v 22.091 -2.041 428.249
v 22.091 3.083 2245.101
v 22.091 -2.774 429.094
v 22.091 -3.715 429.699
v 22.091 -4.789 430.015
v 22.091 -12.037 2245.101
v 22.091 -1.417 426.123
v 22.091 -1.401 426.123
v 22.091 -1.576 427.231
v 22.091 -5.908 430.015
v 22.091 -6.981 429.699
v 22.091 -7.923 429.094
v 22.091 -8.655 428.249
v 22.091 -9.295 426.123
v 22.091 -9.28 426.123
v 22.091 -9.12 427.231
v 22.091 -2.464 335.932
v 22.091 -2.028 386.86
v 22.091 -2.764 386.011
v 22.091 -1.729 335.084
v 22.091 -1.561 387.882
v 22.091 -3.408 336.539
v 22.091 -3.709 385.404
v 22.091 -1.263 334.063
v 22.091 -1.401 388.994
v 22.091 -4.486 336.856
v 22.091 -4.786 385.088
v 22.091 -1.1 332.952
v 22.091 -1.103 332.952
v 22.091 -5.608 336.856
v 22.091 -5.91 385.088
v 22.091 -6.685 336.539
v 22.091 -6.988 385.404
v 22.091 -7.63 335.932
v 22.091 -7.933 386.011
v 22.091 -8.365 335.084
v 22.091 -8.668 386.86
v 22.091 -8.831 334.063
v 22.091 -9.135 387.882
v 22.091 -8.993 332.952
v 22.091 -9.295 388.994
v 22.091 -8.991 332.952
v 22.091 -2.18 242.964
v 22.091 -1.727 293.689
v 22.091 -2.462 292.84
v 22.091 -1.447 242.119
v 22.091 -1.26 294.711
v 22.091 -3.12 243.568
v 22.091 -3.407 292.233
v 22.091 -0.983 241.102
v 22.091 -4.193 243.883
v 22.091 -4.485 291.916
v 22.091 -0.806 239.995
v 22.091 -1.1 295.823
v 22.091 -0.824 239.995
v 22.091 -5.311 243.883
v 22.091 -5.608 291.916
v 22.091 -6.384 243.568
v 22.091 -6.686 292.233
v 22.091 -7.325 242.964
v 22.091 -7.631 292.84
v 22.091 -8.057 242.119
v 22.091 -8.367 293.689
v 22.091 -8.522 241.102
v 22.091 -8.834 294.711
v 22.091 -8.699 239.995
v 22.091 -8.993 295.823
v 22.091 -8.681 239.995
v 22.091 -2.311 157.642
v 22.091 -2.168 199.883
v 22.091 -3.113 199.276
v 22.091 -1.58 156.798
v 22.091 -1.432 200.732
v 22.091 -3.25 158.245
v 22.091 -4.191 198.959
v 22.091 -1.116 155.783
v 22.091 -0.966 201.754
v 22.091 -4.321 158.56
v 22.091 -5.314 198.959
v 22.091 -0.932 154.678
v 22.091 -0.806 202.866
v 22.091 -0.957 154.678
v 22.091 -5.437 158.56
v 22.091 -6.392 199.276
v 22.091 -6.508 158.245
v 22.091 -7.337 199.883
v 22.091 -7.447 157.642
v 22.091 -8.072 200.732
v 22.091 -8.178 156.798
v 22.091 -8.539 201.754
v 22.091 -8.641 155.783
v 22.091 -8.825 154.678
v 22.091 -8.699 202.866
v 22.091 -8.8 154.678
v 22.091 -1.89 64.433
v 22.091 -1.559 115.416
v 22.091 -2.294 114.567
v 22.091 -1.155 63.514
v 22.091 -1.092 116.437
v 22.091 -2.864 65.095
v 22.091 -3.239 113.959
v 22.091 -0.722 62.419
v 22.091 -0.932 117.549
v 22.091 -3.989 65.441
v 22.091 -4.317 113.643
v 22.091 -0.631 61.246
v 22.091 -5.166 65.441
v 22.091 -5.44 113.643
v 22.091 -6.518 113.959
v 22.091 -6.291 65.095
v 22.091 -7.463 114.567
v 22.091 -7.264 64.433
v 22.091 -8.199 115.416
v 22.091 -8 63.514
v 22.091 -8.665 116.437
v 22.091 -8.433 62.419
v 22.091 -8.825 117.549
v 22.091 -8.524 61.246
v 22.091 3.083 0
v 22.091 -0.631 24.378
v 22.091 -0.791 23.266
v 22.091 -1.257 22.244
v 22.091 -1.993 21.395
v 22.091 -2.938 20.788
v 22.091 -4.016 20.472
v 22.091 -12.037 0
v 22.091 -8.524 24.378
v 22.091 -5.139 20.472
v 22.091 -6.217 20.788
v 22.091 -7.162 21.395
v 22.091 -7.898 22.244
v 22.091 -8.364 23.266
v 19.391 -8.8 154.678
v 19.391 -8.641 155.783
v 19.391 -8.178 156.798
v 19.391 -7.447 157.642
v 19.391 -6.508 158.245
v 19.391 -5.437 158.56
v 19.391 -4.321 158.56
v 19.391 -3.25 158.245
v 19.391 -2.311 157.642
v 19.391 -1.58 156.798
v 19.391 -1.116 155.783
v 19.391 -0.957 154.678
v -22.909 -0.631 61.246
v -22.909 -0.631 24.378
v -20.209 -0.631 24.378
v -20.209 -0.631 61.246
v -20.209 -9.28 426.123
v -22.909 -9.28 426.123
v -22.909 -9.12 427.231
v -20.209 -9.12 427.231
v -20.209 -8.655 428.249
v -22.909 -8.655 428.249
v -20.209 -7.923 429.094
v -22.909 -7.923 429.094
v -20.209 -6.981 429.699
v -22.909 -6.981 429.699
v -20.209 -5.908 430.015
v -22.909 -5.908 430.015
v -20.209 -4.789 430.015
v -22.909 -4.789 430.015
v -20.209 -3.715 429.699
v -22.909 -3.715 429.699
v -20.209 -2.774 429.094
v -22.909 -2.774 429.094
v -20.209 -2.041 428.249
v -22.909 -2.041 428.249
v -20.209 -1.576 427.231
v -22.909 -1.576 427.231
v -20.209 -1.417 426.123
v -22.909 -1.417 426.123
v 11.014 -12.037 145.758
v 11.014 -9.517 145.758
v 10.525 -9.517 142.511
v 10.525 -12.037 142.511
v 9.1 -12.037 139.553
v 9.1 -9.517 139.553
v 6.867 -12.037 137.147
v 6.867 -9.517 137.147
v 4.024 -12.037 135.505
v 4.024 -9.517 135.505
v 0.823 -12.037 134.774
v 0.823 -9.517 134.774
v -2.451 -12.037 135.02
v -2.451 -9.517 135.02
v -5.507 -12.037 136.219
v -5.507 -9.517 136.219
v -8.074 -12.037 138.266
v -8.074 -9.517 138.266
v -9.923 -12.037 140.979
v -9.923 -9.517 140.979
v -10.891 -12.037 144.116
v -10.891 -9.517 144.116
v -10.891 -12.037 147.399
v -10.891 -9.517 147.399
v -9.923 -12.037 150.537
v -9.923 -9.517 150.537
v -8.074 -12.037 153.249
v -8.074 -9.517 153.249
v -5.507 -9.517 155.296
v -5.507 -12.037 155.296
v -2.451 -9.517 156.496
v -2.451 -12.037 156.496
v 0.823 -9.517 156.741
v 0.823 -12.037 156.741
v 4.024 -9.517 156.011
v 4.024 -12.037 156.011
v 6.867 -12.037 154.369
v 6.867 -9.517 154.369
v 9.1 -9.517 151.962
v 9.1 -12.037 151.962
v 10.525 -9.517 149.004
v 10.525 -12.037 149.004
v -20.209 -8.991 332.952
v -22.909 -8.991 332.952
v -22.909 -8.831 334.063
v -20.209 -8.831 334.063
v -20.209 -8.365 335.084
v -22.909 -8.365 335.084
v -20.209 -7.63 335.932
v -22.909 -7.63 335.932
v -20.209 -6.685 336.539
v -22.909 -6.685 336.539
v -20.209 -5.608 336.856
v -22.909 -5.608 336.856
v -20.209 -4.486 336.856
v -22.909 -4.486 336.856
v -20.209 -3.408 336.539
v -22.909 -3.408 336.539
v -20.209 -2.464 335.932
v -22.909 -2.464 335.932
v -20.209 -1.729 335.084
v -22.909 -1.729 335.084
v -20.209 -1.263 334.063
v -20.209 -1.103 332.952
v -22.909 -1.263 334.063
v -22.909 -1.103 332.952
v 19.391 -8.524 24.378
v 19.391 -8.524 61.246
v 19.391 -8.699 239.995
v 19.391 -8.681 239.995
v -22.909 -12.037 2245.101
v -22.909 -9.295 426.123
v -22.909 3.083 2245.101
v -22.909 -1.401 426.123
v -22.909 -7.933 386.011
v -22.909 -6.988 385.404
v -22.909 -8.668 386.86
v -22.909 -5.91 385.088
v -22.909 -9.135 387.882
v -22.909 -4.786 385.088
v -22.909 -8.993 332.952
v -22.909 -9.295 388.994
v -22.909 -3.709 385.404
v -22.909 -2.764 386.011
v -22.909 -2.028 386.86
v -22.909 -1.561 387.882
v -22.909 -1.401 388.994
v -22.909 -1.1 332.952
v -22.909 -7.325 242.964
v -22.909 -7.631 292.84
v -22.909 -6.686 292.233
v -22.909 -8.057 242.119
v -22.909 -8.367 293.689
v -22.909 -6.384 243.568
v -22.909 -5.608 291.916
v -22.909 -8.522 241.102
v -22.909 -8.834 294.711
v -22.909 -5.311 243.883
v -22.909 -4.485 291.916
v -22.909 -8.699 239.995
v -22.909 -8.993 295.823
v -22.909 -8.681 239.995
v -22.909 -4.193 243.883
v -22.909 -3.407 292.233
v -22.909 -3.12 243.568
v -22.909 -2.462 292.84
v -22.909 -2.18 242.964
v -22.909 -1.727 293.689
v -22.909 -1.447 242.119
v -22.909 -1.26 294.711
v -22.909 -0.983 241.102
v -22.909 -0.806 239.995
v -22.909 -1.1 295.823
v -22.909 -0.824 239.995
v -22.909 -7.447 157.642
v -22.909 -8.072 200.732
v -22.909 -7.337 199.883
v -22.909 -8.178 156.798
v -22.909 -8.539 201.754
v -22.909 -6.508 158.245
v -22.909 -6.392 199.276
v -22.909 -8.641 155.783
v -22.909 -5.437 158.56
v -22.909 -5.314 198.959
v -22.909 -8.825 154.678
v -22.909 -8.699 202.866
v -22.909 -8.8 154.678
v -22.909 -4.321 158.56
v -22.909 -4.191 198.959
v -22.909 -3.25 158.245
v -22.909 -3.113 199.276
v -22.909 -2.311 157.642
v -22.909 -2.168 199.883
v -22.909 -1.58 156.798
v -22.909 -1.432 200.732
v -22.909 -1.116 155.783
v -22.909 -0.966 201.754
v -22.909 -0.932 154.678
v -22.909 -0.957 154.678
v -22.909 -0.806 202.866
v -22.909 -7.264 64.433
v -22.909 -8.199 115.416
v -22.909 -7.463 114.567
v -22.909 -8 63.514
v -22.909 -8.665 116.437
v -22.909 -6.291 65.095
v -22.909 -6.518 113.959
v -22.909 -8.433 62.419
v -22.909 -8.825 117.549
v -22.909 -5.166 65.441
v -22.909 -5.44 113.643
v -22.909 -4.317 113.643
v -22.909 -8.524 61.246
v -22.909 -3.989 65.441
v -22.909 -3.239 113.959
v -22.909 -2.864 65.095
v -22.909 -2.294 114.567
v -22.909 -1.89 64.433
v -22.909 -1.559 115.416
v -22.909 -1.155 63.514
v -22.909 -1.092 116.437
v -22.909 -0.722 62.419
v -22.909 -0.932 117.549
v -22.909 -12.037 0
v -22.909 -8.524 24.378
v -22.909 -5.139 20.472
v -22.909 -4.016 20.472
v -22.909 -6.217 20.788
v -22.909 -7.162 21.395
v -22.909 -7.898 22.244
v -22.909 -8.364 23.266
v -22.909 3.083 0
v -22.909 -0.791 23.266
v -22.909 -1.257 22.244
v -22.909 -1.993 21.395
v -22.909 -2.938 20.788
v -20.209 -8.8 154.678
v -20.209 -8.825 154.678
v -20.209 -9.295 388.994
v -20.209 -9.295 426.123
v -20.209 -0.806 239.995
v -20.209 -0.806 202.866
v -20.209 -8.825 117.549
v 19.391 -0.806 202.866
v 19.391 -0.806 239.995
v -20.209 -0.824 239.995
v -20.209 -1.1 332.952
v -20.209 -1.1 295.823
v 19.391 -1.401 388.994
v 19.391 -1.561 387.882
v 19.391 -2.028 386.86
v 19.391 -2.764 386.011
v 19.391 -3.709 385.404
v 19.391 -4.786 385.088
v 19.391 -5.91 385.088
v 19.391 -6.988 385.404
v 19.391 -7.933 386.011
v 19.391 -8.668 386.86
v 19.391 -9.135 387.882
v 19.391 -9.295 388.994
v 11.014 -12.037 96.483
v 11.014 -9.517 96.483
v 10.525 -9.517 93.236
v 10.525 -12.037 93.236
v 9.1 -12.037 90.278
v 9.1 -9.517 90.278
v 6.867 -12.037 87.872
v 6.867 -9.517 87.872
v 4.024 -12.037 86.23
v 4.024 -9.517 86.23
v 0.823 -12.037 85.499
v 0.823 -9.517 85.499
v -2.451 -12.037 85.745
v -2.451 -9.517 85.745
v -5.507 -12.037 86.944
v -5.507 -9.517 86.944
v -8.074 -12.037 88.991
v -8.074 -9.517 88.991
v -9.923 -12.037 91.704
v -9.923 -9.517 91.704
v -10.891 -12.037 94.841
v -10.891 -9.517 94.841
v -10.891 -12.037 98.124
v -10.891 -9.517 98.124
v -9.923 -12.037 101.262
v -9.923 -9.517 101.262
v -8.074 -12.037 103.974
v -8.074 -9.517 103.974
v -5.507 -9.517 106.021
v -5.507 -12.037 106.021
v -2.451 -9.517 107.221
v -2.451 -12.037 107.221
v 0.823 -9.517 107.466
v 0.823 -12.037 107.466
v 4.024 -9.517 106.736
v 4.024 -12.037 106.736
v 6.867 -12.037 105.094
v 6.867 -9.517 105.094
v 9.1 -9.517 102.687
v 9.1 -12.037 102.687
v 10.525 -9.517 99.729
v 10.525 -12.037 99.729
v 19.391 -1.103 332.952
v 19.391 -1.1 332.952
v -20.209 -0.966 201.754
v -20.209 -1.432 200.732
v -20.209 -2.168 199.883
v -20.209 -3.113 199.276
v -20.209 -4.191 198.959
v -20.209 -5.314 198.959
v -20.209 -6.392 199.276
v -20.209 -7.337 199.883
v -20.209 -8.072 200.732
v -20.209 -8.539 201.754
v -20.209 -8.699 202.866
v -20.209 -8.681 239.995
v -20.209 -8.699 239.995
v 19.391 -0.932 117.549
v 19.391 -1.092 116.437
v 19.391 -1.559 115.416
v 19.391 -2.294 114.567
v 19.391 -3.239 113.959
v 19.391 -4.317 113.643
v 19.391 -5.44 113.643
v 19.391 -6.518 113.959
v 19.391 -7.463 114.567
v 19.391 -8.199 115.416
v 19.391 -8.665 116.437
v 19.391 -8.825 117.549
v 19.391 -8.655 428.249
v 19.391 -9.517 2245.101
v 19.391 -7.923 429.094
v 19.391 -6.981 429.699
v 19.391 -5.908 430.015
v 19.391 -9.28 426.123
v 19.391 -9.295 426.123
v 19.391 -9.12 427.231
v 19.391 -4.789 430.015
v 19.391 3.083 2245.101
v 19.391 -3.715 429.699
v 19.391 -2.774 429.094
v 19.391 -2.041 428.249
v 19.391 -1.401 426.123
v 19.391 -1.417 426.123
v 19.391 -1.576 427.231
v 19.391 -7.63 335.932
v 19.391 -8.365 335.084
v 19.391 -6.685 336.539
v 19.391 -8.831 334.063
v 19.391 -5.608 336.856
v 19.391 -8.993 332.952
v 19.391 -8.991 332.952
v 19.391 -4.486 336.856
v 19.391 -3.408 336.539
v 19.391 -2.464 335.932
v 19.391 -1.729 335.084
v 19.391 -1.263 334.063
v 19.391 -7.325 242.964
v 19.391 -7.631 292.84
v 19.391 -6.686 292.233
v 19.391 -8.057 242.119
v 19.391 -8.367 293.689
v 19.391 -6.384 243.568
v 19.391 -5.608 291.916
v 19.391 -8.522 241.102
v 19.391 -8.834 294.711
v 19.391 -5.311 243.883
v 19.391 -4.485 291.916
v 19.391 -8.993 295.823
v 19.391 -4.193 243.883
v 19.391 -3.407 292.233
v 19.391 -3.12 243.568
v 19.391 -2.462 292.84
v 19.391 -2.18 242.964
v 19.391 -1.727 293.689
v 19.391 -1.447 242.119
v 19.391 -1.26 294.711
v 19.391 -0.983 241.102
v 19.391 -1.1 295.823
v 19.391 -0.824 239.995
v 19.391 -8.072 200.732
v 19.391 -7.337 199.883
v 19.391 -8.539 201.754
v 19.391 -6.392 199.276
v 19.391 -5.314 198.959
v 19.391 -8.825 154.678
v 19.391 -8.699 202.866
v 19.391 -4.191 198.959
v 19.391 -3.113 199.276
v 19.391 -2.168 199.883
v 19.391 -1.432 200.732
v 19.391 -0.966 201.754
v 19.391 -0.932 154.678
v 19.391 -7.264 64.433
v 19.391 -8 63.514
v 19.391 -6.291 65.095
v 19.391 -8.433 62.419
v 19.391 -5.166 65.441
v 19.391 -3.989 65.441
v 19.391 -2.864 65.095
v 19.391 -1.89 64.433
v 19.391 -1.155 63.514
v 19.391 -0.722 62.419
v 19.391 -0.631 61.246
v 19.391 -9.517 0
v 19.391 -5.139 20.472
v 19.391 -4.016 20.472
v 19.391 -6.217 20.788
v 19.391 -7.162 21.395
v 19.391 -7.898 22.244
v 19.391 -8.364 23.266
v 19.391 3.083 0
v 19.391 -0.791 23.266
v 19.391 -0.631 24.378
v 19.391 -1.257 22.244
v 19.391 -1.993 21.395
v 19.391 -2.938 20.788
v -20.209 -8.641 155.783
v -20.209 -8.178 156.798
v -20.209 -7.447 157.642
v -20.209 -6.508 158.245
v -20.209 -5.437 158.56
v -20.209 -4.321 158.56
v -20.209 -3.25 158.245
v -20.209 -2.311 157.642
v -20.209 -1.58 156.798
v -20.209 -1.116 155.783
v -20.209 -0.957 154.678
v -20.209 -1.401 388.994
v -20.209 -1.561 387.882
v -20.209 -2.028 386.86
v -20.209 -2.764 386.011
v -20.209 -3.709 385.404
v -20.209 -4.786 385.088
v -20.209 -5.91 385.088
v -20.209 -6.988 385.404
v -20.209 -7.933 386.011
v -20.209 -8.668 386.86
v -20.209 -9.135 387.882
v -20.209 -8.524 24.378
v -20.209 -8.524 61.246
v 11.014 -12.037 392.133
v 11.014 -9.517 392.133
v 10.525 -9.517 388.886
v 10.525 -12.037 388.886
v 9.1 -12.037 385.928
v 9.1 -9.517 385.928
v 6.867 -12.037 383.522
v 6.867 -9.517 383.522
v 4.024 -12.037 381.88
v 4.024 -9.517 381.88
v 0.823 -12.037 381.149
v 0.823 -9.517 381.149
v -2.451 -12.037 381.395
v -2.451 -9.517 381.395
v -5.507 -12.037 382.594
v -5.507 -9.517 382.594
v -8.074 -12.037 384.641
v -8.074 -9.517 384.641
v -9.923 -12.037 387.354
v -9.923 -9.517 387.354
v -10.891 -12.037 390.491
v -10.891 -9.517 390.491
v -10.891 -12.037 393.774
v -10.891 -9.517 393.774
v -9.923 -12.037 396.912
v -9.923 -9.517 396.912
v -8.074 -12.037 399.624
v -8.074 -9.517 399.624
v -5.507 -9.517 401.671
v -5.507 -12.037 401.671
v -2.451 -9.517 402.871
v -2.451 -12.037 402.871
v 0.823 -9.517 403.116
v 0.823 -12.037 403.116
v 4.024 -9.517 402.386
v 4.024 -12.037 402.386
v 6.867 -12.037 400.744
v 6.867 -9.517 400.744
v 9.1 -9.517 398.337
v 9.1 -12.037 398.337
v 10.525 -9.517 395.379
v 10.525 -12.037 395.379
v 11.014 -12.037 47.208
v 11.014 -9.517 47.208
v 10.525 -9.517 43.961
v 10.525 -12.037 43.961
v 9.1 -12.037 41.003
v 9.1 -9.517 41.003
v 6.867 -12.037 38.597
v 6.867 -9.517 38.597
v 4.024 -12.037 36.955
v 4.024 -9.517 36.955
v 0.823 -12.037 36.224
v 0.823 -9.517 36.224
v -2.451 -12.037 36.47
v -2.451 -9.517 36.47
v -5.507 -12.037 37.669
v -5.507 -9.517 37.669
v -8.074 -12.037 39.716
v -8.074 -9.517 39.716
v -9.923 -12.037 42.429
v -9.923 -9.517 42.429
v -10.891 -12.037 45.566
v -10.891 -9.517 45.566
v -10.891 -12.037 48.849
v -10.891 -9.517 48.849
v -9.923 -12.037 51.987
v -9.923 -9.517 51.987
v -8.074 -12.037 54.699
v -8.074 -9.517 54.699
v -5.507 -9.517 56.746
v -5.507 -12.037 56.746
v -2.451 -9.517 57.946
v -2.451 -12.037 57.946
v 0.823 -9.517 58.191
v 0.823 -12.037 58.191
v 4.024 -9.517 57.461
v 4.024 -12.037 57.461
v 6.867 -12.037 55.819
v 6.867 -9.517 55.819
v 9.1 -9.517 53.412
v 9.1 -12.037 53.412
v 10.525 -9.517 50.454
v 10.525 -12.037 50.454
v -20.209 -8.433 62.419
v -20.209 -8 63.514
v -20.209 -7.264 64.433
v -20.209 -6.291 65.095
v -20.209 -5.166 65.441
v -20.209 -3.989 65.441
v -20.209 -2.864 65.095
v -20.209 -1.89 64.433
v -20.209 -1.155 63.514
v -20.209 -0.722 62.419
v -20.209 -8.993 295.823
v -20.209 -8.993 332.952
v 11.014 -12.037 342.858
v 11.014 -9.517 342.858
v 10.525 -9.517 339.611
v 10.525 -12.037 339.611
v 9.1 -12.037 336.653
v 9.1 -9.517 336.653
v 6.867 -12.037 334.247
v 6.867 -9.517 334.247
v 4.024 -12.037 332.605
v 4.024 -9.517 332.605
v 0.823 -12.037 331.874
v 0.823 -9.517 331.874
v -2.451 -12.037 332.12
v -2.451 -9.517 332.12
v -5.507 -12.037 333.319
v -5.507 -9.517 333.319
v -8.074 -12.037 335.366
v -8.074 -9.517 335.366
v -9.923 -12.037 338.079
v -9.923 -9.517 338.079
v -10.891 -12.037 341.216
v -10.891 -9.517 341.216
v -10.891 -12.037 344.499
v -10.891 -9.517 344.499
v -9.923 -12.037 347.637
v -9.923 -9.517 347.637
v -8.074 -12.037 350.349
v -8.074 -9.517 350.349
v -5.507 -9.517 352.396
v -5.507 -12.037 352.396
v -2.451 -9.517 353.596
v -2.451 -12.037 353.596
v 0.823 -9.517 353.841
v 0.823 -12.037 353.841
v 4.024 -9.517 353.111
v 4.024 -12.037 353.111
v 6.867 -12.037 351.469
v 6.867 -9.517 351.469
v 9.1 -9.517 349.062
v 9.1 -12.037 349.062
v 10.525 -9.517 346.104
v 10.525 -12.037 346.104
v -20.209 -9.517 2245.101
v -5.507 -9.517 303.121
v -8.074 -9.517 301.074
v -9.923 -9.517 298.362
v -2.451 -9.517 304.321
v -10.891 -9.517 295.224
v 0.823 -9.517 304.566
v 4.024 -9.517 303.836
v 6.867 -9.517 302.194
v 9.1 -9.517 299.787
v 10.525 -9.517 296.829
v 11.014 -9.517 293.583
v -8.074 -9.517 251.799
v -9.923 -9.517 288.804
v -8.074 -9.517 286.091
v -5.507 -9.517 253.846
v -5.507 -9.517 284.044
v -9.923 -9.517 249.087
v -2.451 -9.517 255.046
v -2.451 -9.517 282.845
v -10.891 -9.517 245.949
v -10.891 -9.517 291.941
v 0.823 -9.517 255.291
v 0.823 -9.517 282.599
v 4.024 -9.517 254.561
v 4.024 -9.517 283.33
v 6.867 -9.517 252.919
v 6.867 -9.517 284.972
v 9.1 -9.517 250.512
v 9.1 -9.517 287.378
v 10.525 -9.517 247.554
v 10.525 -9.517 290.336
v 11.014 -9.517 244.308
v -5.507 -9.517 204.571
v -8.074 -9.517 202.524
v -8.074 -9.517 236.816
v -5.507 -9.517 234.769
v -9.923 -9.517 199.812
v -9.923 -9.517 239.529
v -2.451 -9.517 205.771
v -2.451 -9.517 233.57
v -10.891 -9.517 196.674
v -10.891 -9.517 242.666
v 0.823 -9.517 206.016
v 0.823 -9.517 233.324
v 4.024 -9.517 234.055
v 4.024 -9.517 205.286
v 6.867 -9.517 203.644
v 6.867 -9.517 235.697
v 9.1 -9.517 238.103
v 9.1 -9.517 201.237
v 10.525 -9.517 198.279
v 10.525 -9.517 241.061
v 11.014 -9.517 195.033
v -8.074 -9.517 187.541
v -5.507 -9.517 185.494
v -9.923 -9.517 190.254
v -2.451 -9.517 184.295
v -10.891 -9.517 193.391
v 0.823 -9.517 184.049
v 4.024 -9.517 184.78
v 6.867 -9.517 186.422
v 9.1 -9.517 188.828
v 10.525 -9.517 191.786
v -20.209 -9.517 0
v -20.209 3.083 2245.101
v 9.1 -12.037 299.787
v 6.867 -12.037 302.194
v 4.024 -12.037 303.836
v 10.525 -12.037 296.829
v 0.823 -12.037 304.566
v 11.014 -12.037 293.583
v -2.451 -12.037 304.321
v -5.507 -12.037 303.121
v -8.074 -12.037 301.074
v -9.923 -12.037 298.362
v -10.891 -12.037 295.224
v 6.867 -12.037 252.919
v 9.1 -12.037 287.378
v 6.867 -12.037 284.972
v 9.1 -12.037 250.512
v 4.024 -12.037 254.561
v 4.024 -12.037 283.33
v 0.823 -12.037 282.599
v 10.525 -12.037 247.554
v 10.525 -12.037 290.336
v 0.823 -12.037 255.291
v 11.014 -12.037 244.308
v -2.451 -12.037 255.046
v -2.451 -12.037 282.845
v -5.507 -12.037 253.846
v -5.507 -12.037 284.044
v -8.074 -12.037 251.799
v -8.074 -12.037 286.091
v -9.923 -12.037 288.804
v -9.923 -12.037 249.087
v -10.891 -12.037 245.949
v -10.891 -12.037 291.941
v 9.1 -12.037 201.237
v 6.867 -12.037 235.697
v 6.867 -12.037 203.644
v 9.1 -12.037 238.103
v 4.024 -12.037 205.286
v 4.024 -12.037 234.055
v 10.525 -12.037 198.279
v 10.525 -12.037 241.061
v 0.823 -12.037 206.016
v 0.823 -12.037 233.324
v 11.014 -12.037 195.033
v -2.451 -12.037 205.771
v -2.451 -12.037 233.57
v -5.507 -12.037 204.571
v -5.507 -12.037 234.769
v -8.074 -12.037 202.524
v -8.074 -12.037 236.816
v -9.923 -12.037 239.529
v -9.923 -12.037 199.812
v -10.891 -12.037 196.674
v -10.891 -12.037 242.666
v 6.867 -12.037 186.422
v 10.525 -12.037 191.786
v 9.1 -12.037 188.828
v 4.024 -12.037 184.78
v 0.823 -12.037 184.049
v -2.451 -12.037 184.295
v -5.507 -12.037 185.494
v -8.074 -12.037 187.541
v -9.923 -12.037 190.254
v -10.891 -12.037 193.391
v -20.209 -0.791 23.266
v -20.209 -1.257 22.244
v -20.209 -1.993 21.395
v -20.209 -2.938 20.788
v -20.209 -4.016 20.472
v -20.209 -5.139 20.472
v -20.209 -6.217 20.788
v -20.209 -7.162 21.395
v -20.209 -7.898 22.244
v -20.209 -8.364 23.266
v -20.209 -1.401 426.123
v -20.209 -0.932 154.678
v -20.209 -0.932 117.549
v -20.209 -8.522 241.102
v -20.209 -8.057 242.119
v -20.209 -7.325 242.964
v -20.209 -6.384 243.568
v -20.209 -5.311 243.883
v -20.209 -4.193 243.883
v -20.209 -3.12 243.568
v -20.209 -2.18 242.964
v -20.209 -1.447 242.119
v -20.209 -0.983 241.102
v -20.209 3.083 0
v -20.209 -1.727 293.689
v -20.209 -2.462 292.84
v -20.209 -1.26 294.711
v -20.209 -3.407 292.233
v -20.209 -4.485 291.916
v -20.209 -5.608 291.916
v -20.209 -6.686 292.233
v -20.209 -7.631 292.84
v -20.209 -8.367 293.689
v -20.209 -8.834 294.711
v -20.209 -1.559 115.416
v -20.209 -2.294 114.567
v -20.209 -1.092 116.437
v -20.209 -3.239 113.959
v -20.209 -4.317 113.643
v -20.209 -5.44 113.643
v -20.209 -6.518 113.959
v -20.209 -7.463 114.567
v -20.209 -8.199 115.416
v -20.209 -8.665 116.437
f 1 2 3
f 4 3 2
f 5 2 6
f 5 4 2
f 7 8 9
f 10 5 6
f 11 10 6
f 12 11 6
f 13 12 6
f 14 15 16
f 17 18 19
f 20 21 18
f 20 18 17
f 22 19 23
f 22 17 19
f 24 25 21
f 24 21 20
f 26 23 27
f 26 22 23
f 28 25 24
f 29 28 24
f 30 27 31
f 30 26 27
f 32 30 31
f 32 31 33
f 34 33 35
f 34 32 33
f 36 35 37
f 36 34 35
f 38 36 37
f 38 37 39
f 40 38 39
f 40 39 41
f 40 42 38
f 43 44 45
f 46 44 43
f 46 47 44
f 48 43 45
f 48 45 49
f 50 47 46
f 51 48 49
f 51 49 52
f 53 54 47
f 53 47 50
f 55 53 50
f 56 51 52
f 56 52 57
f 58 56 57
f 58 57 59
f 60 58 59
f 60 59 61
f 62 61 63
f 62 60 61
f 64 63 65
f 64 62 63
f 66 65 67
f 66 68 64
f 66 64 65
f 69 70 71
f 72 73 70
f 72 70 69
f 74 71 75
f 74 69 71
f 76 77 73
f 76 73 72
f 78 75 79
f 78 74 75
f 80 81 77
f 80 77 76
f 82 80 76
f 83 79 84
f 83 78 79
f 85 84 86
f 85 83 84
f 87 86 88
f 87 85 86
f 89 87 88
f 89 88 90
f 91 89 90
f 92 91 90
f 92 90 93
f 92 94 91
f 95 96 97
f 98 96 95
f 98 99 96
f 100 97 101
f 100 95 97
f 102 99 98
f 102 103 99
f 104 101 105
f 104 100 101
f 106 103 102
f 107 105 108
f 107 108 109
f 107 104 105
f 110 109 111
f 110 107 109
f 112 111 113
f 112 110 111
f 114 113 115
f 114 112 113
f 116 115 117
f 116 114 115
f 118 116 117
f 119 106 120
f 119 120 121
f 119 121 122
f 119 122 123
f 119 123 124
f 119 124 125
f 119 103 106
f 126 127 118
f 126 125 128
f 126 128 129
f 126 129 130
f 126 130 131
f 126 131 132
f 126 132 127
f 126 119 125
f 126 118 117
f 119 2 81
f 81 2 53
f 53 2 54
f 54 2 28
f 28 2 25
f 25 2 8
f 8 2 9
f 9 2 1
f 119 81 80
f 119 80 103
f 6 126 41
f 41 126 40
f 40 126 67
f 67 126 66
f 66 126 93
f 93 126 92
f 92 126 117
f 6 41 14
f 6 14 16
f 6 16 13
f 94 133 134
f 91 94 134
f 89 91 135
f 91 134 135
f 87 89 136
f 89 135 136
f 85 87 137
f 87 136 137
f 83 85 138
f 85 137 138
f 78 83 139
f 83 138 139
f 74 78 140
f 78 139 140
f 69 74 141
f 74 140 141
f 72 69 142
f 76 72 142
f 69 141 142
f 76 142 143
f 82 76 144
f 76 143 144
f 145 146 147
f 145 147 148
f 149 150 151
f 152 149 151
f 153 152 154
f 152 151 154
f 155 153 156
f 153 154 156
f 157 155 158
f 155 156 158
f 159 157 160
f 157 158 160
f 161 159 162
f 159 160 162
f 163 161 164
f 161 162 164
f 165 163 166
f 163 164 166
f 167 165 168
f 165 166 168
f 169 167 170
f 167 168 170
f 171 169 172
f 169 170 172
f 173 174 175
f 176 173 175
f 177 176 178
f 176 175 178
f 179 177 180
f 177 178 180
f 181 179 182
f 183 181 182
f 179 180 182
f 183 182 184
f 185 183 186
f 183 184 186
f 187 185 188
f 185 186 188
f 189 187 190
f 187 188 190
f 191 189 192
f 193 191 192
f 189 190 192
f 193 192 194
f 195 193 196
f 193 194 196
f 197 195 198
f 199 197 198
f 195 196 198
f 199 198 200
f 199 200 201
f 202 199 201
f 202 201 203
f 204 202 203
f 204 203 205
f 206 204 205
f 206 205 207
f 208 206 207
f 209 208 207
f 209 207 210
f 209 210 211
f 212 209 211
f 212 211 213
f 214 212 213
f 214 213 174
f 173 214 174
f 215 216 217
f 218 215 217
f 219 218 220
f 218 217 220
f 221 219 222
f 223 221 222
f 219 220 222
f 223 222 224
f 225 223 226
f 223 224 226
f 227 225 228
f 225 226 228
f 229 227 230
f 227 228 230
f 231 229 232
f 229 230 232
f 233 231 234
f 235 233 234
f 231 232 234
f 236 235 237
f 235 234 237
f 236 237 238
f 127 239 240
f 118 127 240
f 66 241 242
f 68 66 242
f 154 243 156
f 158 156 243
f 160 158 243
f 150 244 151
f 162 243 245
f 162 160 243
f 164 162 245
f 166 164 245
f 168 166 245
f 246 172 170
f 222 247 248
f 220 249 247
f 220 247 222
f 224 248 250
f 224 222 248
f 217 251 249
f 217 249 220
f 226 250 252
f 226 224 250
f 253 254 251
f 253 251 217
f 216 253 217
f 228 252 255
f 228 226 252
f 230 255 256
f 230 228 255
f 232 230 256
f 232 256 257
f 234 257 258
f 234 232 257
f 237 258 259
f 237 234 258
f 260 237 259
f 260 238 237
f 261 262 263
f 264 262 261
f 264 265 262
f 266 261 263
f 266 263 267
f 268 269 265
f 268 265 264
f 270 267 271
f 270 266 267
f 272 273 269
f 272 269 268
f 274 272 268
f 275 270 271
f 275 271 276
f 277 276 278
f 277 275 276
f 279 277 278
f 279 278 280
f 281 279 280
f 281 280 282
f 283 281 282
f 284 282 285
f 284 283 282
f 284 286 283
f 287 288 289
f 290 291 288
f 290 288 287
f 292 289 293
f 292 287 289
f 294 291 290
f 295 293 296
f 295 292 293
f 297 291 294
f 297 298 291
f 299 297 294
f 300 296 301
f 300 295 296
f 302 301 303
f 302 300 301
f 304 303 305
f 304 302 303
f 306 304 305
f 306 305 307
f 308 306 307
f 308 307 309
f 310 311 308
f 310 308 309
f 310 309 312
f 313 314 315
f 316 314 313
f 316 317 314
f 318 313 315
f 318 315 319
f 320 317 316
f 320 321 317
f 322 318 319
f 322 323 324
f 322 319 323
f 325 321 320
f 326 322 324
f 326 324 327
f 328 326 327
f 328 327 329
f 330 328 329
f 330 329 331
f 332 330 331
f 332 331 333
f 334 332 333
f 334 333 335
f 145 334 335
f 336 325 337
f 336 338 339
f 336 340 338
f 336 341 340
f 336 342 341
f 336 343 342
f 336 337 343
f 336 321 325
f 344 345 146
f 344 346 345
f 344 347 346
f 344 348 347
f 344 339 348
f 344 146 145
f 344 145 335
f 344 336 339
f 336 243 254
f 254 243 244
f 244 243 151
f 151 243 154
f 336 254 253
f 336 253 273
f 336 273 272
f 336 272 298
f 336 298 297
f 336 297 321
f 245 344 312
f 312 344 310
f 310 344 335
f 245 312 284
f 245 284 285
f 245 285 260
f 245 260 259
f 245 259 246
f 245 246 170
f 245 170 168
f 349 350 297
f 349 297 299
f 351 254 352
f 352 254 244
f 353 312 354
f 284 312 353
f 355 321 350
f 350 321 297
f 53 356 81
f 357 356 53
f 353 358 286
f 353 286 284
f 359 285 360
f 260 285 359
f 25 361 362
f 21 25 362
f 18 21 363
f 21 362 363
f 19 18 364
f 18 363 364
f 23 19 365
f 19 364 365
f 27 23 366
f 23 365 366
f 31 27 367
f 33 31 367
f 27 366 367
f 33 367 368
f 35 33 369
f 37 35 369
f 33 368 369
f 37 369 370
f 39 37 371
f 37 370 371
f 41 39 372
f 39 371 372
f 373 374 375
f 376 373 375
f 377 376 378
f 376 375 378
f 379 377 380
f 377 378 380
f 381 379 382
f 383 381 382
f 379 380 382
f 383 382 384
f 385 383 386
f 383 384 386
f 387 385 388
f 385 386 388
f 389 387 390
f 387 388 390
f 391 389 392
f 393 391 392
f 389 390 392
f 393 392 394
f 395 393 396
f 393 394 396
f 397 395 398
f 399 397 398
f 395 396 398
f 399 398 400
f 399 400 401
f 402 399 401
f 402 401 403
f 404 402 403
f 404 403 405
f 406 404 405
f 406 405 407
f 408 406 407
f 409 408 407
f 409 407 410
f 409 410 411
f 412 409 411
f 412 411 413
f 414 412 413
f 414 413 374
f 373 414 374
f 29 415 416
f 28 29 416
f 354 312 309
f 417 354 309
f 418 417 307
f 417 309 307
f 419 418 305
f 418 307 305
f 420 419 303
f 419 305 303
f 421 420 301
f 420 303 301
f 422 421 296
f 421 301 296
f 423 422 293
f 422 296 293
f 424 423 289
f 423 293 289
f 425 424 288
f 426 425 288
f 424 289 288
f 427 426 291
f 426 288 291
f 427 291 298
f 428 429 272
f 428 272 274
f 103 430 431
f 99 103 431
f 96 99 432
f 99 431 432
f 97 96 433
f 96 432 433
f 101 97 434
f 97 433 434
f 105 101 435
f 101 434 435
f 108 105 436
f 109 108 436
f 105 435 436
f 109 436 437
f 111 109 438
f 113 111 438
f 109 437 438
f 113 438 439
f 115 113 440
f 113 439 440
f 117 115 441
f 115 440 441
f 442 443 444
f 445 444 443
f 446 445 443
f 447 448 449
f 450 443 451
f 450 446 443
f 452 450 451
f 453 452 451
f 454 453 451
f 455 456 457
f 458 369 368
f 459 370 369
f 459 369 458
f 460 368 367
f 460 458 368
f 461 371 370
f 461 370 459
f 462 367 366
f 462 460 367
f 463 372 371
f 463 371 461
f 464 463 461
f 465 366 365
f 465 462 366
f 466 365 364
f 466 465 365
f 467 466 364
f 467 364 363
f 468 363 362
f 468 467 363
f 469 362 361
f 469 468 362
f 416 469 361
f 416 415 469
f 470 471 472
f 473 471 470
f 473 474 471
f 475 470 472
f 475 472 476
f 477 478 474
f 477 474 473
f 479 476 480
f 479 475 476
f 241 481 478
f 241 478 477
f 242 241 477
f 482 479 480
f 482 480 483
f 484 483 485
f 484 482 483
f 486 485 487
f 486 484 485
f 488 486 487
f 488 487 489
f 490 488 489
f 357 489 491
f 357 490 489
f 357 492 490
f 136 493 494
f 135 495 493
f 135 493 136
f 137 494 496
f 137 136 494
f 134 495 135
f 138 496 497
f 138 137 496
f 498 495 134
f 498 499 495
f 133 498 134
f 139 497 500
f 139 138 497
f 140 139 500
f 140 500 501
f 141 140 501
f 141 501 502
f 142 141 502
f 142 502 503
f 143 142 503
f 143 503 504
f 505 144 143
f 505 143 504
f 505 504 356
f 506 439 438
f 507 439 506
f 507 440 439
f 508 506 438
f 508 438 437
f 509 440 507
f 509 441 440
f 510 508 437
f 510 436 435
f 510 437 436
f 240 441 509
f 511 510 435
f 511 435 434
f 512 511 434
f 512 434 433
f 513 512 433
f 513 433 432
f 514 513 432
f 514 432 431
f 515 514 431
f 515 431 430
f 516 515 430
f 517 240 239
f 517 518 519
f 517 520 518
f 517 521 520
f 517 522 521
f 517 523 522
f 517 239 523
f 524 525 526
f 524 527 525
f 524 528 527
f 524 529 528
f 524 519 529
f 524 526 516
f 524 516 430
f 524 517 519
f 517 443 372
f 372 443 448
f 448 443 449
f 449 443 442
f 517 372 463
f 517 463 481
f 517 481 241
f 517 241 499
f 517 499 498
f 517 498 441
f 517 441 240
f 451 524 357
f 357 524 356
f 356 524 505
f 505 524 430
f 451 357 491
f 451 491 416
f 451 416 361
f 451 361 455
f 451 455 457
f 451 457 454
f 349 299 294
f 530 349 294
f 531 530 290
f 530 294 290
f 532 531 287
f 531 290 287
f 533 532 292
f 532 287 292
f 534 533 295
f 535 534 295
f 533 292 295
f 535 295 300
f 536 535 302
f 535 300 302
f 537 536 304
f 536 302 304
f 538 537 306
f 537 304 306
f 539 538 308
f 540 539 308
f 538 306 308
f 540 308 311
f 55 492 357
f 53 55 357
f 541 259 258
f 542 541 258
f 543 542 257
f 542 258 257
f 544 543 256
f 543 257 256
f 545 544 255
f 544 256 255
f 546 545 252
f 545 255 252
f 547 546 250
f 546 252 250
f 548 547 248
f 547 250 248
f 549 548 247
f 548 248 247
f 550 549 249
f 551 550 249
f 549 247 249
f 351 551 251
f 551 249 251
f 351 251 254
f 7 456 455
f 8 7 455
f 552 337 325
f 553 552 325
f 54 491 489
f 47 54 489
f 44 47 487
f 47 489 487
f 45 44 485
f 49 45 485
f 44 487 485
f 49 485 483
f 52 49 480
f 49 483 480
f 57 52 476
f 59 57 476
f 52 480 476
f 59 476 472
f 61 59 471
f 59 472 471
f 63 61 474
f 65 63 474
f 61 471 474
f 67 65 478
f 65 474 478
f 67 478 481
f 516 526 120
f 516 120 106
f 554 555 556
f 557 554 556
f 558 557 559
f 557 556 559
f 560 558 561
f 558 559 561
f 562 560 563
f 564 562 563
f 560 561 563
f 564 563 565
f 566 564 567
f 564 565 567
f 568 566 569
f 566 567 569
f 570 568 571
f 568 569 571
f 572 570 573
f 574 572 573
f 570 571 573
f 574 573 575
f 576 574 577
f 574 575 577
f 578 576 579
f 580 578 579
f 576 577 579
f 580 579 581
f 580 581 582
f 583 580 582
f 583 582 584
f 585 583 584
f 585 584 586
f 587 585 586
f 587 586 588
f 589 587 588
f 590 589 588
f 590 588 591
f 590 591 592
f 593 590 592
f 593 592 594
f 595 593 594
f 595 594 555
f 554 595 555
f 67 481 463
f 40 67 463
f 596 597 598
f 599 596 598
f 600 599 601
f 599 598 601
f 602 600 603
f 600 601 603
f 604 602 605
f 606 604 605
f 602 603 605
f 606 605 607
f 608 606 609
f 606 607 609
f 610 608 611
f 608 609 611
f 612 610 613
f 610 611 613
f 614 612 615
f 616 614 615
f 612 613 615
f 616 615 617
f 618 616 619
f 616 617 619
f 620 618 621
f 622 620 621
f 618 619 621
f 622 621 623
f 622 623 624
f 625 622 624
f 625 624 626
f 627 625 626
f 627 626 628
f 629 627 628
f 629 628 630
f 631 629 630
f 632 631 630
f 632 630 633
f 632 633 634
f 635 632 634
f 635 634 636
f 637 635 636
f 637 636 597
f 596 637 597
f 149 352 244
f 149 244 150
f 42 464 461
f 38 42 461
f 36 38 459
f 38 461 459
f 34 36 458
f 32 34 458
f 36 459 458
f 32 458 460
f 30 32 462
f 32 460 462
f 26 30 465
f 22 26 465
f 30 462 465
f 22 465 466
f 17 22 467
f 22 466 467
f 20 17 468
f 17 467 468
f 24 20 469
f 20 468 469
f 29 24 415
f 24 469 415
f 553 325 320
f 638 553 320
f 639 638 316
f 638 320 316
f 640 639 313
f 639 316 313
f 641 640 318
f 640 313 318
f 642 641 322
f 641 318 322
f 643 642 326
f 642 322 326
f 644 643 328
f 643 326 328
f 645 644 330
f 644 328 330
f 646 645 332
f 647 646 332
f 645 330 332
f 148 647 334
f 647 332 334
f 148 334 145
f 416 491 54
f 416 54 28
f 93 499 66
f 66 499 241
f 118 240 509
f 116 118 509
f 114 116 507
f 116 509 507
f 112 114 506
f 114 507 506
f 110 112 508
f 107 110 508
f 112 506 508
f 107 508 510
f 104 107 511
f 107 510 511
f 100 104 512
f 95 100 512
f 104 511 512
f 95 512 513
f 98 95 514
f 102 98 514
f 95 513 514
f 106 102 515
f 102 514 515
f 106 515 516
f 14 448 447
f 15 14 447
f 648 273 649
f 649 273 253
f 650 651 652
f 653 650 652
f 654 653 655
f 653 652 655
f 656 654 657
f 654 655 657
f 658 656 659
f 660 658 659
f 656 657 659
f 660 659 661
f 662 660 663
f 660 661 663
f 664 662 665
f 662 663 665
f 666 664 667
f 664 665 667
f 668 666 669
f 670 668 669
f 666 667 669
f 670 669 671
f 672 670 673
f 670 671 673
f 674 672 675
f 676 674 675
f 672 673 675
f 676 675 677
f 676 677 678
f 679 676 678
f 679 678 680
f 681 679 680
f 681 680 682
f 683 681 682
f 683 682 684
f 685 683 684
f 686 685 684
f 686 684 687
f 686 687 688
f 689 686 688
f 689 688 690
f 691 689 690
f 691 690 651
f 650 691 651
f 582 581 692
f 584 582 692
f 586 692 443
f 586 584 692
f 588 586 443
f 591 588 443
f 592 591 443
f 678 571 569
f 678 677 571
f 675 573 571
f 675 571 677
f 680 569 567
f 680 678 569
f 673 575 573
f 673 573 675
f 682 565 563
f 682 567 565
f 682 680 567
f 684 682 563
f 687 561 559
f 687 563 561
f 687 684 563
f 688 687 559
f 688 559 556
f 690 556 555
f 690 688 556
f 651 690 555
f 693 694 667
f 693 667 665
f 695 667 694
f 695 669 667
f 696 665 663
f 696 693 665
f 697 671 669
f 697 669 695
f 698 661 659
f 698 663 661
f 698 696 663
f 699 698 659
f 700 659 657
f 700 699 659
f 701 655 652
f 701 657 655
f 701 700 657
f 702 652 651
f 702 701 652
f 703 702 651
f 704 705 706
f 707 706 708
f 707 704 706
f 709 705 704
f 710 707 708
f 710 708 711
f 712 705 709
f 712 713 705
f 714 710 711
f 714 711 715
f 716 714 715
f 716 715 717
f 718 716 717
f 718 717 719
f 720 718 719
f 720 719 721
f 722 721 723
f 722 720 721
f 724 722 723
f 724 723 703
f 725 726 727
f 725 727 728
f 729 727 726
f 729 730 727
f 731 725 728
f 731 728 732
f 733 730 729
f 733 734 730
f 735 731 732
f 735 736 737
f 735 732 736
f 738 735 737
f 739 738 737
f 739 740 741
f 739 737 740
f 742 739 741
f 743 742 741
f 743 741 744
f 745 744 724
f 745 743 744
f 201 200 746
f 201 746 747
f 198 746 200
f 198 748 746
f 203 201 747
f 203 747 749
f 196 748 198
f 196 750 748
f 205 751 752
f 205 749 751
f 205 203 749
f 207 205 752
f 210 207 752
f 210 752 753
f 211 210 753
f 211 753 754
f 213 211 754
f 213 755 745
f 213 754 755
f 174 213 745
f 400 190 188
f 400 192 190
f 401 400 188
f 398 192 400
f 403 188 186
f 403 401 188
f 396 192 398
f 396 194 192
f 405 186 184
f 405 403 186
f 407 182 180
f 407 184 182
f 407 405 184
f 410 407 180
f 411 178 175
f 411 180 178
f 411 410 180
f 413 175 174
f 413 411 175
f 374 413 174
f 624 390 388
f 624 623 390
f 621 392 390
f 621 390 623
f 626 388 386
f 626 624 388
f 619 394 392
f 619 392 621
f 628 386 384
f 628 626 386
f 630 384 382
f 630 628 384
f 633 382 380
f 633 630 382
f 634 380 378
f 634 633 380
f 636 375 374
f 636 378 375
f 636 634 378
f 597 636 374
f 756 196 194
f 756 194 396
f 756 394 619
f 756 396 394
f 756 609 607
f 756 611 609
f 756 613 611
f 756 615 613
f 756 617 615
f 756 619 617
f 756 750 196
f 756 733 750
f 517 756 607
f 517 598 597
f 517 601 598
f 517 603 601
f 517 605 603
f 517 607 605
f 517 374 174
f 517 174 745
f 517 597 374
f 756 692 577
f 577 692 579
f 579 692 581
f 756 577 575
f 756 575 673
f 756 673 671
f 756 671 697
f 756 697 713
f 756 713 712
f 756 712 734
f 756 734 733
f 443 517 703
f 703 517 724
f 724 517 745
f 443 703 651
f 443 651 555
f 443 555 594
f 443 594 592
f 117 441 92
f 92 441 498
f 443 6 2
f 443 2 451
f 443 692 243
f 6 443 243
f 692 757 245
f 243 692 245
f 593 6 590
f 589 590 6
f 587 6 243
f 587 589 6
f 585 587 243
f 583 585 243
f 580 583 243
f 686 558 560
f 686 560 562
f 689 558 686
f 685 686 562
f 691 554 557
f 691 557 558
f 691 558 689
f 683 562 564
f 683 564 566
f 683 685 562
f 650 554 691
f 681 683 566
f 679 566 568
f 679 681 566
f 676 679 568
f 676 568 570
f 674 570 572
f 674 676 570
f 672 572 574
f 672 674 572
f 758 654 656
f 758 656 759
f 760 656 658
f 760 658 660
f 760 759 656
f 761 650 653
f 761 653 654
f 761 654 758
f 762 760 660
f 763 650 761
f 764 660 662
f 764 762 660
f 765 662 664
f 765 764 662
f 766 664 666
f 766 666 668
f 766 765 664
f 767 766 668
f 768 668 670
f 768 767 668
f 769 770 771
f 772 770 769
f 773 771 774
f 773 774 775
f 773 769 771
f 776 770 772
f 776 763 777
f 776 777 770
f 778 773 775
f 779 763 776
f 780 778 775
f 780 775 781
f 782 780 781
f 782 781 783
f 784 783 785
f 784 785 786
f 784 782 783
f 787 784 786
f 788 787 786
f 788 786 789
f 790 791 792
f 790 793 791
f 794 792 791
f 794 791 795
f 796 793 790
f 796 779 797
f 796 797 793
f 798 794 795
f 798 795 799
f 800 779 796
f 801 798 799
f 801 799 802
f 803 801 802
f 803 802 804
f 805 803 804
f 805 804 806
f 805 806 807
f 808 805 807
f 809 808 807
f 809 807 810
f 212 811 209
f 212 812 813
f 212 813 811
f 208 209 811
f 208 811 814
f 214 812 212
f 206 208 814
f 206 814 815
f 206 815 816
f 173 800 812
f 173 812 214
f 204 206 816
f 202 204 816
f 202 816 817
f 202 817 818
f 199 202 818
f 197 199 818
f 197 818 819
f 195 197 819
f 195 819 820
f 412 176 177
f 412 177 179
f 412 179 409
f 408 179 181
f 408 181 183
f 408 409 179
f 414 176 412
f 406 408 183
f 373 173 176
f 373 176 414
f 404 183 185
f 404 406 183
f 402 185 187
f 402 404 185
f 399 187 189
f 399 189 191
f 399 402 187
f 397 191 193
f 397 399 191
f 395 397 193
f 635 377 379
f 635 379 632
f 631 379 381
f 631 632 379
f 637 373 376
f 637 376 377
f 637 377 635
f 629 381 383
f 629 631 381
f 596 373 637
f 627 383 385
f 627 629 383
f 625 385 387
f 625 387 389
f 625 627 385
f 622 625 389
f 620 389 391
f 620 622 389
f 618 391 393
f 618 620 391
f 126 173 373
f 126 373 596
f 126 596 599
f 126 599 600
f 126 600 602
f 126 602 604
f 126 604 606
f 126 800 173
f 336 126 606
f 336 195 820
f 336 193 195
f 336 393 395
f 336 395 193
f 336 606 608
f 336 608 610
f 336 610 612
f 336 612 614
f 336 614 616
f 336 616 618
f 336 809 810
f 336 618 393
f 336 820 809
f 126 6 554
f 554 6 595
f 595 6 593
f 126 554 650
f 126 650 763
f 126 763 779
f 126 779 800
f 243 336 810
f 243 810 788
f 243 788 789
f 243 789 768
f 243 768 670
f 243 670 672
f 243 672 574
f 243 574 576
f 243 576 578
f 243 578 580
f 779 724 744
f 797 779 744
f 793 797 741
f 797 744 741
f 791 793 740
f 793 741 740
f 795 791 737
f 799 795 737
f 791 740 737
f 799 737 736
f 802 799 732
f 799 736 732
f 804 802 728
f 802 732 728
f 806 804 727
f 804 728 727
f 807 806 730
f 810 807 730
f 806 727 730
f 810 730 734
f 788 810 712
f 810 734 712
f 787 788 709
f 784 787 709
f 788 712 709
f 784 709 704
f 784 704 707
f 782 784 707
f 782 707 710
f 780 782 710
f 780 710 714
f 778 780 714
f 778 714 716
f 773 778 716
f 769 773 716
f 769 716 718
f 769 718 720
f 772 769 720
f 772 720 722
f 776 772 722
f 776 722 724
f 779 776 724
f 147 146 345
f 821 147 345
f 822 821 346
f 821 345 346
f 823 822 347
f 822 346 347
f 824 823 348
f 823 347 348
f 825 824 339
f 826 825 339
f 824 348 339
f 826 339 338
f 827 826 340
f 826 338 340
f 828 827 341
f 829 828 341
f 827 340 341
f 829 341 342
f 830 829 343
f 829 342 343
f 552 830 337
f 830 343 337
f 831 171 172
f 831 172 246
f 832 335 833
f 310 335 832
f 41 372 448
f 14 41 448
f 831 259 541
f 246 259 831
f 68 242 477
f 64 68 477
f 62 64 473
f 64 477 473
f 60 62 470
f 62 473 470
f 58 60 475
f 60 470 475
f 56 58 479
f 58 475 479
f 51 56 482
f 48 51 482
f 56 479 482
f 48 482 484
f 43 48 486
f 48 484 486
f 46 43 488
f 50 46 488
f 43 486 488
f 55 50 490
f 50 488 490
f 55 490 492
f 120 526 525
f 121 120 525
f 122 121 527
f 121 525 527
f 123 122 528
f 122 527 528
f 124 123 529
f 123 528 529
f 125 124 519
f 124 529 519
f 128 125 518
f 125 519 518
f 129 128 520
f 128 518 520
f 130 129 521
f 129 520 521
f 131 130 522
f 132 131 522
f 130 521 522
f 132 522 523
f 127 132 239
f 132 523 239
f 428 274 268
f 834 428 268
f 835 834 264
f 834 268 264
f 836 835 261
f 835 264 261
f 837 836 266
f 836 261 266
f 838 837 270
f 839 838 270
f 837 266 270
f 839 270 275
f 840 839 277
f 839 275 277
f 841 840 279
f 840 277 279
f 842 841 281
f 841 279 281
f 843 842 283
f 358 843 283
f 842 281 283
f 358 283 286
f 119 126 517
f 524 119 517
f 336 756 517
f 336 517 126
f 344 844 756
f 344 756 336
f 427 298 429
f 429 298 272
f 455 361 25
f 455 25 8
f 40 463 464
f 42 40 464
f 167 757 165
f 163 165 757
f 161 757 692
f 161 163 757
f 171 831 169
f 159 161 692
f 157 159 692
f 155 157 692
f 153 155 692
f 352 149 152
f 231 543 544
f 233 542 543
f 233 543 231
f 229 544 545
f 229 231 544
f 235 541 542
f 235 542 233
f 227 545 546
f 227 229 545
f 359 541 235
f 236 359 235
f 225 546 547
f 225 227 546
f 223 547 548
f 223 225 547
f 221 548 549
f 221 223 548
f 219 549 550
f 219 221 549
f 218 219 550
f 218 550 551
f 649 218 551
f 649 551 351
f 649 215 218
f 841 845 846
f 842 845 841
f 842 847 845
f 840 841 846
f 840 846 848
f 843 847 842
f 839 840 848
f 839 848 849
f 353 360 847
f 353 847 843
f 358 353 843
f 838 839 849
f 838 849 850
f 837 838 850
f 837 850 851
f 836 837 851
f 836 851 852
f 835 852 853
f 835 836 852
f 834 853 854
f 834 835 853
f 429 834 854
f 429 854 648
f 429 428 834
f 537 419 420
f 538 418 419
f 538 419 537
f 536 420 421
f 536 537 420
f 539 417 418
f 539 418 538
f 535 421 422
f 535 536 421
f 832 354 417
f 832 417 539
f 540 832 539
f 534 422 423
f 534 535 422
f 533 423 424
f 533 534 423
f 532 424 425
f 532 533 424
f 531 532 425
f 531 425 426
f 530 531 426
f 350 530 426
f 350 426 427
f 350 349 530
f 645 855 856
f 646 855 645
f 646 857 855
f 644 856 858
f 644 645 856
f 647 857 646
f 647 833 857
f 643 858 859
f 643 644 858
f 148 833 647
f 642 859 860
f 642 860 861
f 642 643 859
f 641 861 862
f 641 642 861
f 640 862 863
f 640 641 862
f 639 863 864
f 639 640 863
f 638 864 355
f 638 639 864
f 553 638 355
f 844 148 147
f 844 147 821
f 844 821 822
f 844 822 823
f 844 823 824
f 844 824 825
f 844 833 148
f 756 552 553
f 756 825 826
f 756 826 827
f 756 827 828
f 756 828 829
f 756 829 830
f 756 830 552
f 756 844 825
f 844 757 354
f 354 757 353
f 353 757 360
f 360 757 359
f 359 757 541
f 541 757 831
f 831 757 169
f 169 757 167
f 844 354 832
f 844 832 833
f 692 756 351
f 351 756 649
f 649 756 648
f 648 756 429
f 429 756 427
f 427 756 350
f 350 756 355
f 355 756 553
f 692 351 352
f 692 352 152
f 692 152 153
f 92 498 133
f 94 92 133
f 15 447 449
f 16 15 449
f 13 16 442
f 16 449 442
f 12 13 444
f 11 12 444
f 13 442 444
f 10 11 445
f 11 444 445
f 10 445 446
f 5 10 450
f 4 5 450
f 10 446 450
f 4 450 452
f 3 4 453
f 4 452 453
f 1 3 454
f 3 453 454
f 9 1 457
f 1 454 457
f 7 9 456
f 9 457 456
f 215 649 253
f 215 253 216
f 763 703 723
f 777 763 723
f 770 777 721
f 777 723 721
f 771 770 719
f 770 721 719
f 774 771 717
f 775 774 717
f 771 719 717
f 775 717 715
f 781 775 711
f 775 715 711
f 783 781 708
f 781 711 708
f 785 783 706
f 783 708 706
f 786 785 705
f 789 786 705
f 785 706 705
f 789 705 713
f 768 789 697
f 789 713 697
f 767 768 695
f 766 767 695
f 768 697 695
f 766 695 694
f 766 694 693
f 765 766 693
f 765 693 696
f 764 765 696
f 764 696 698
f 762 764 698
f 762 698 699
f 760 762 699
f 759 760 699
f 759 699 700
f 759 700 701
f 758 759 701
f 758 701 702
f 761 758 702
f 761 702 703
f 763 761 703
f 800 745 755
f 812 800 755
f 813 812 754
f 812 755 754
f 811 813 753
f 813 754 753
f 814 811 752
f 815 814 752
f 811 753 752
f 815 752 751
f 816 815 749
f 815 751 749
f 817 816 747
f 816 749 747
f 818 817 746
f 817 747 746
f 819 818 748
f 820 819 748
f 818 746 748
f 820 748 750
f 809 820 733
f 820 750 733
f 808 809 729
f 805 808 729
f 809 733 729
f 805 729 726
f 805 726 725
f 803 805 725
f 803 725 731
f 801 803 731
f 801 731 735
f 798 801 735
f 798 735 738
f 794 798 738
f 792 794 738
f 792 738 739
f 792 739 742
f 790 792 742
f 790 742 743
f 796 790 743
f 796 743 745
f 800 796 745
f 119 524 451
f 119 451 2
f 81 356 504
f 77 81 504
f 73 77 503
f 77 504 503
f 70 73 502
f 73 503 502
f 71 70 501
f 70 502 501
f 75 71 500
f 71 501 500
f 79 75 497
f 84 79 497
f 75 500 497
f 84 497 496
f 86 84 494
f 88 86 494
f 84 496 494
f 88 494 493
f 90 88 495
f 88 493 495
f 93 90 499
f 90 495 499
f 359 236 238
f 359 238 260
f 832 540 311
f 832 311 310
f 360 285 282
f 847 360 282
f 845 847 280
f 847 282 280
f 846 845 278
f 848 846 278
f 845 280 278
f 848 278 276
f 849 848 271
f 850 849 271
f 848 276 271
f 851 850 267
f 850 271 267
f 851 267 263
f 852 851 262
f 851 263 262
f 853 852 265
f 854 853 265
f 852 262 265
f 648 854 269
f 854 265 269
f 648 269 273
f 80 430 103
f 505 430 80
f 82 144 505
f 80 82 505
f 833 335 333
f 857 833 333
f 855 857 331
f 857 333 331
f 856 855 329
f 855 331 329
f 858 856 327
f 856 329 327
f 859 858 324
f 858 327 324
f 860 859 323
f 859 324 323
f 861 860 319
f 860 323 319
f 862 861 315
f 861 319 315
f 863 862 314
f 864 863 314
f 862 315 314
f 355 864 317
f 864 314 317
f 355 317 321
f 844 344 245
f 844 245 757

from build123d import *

# Parameters (mm, degrees)
BOSS_EXTRUDE1_DEPTH                     = 1247.2780762
BOSS_EXTRUDE1_DEPTH_BACK                = 0.0001
CBORE_FOR_M5_HEX_HEAD_BOLT1_D           = 5.8
CBORE_FOR_M5_HEX_HEAD_BOLT1_CBORE_D     = 12.238
CBORE_FOR_M5_HEX_HEAD_BOLT1_CBORE_DEPTH = 3.5
SKETCH12_R                              = 2.192561761
SKETCH12_R_2                            = 2.198183891
SKETCH12_R_3                            = 2.178555517
SKETCH12_R_4                            = 2.1825859
SKETCH12_R_5                            = 2.191093622
SKETCH12_R_6                            = 2.184131757
SKETCH12_W                              = 20.639060425
SKETCH12_H                              = 4.385123522
SKETCH12_W_2                            = 20.62721893
CUT_EXTRUDE3_DEPTH                      = 219
SCALE1_SCALE                            = 1.8


with BuildPart() as part:
    # Sketch1 → Boss-Extrude1 (new, two sides: drawn at the far end of the back side and taken through both)
    with BuildSketch(Plane.XY.offset(-BOSS_EXTRUDE1_DEPTH_BACK)):
        Polygon((-11.227272727, -5.287267028), (10.772727273, -5.287267028), (10.772727273, 1.712732972), (12.272727273, 1.712732972), (12.272727273, -6.687267028), (-12.727272727, -6.687267028), (-12.727272727, 1.712732972), (-11.227272727, 1.712732972), align=None)
    extrude(amount=BOSS_EXTRUDE1_DEPTH + BOSS_EXTRUDE1_DEPTH_BACK)

    # CBORE for M5 Hex Head Bolt1 (through all)
    with Locations(Plane(origin=(0, -5.287267028, 0), x_dir=(1, 0, 0), z_dir=(0, 1, 0))):
        with Locations((0, -26.226555277), (0, -53.601555277), (0, -80.976555277), (0, -108.351555277), (0, -135.726555277), (0, -163.101555277), (0, -190.476555277), (0, -217.851555277)):
            CounterBoreHole(CBORE_FOR_M5_HEX_HEAD_BOLT1_D / 2, CBORE_FOR_M5_HEX_HEAD_BOLT1_CBORE_D / 2, CBORE_FOR_M5_HEX_HEAD_BOLT1_CBORE_DEPTH)

    # Sketch12 → Cut-Extrude3 (cut)
    with BuildSketch(Plane.ZY.offset(12.727272727)):
        with Locations((13.543356252, -2.543007858)):
            Circle(SKETCH12_R)
        with Locations((34.182416677, -2.543007858)):
            Circle(SKETCH12_R_2)
        with Locations((65.305213992, -2.710382167)):
            Circle(SKETCH12_R)
        with Locations((85.932432922, -2.710382167)):
            Circle(SKETCH12_R_3)
        with Locations((112.703179644, -2.640183104)):
            Circle(SKETCH12_R)
        with Locations((133.330398574, -2.640183104)):
            Circle(SKETCH12_R_4)
        with Locations((164.345985992, -2.803798306)):
            Circle(SKETCH12_R)
        with Locations((184.973204922, -2.803798306)):
            Circle(SKETCH12_R_5)
        with Locations((216.107843732, -2.971172615)):
            Circle(SKETCH12_R)
        with Locations((236.735062662, -2.971172615)):
            Circle(SKETCH12_R_6)
        with Locations((23.862886465, -2.543007858)):
            Rectangle(SKETCH12_W, SKETCH12_H)
        with Locations((75.618823457, -2.710382167)):
            Rectangle(SKETCH12_W_2, SKETCH12_H)
        with Locations((123.016789109, -2.640183104)):
            Rectangle(SKETCH12_W_2, SKETCH12_H)
        with Locations((174.659595457, -2.803798306)):
            Rectangle(SKETCH12_W_2, SKETCH12_H)
        with Locations((226.421453197, -2.971172615)):
            Rectangle(SKETCH12_W_2, SKETCH12_H)
    extrude(amount=-CUT_EXTRUDE3_DEPTH, mode=Mode.SUBTRACT)


with BuildPart() as part_1:
    # Scale1: scaled about (0, 0, 0)
    add(part.part.scale(SCALE1_SCALE))


solid = part_1.part
